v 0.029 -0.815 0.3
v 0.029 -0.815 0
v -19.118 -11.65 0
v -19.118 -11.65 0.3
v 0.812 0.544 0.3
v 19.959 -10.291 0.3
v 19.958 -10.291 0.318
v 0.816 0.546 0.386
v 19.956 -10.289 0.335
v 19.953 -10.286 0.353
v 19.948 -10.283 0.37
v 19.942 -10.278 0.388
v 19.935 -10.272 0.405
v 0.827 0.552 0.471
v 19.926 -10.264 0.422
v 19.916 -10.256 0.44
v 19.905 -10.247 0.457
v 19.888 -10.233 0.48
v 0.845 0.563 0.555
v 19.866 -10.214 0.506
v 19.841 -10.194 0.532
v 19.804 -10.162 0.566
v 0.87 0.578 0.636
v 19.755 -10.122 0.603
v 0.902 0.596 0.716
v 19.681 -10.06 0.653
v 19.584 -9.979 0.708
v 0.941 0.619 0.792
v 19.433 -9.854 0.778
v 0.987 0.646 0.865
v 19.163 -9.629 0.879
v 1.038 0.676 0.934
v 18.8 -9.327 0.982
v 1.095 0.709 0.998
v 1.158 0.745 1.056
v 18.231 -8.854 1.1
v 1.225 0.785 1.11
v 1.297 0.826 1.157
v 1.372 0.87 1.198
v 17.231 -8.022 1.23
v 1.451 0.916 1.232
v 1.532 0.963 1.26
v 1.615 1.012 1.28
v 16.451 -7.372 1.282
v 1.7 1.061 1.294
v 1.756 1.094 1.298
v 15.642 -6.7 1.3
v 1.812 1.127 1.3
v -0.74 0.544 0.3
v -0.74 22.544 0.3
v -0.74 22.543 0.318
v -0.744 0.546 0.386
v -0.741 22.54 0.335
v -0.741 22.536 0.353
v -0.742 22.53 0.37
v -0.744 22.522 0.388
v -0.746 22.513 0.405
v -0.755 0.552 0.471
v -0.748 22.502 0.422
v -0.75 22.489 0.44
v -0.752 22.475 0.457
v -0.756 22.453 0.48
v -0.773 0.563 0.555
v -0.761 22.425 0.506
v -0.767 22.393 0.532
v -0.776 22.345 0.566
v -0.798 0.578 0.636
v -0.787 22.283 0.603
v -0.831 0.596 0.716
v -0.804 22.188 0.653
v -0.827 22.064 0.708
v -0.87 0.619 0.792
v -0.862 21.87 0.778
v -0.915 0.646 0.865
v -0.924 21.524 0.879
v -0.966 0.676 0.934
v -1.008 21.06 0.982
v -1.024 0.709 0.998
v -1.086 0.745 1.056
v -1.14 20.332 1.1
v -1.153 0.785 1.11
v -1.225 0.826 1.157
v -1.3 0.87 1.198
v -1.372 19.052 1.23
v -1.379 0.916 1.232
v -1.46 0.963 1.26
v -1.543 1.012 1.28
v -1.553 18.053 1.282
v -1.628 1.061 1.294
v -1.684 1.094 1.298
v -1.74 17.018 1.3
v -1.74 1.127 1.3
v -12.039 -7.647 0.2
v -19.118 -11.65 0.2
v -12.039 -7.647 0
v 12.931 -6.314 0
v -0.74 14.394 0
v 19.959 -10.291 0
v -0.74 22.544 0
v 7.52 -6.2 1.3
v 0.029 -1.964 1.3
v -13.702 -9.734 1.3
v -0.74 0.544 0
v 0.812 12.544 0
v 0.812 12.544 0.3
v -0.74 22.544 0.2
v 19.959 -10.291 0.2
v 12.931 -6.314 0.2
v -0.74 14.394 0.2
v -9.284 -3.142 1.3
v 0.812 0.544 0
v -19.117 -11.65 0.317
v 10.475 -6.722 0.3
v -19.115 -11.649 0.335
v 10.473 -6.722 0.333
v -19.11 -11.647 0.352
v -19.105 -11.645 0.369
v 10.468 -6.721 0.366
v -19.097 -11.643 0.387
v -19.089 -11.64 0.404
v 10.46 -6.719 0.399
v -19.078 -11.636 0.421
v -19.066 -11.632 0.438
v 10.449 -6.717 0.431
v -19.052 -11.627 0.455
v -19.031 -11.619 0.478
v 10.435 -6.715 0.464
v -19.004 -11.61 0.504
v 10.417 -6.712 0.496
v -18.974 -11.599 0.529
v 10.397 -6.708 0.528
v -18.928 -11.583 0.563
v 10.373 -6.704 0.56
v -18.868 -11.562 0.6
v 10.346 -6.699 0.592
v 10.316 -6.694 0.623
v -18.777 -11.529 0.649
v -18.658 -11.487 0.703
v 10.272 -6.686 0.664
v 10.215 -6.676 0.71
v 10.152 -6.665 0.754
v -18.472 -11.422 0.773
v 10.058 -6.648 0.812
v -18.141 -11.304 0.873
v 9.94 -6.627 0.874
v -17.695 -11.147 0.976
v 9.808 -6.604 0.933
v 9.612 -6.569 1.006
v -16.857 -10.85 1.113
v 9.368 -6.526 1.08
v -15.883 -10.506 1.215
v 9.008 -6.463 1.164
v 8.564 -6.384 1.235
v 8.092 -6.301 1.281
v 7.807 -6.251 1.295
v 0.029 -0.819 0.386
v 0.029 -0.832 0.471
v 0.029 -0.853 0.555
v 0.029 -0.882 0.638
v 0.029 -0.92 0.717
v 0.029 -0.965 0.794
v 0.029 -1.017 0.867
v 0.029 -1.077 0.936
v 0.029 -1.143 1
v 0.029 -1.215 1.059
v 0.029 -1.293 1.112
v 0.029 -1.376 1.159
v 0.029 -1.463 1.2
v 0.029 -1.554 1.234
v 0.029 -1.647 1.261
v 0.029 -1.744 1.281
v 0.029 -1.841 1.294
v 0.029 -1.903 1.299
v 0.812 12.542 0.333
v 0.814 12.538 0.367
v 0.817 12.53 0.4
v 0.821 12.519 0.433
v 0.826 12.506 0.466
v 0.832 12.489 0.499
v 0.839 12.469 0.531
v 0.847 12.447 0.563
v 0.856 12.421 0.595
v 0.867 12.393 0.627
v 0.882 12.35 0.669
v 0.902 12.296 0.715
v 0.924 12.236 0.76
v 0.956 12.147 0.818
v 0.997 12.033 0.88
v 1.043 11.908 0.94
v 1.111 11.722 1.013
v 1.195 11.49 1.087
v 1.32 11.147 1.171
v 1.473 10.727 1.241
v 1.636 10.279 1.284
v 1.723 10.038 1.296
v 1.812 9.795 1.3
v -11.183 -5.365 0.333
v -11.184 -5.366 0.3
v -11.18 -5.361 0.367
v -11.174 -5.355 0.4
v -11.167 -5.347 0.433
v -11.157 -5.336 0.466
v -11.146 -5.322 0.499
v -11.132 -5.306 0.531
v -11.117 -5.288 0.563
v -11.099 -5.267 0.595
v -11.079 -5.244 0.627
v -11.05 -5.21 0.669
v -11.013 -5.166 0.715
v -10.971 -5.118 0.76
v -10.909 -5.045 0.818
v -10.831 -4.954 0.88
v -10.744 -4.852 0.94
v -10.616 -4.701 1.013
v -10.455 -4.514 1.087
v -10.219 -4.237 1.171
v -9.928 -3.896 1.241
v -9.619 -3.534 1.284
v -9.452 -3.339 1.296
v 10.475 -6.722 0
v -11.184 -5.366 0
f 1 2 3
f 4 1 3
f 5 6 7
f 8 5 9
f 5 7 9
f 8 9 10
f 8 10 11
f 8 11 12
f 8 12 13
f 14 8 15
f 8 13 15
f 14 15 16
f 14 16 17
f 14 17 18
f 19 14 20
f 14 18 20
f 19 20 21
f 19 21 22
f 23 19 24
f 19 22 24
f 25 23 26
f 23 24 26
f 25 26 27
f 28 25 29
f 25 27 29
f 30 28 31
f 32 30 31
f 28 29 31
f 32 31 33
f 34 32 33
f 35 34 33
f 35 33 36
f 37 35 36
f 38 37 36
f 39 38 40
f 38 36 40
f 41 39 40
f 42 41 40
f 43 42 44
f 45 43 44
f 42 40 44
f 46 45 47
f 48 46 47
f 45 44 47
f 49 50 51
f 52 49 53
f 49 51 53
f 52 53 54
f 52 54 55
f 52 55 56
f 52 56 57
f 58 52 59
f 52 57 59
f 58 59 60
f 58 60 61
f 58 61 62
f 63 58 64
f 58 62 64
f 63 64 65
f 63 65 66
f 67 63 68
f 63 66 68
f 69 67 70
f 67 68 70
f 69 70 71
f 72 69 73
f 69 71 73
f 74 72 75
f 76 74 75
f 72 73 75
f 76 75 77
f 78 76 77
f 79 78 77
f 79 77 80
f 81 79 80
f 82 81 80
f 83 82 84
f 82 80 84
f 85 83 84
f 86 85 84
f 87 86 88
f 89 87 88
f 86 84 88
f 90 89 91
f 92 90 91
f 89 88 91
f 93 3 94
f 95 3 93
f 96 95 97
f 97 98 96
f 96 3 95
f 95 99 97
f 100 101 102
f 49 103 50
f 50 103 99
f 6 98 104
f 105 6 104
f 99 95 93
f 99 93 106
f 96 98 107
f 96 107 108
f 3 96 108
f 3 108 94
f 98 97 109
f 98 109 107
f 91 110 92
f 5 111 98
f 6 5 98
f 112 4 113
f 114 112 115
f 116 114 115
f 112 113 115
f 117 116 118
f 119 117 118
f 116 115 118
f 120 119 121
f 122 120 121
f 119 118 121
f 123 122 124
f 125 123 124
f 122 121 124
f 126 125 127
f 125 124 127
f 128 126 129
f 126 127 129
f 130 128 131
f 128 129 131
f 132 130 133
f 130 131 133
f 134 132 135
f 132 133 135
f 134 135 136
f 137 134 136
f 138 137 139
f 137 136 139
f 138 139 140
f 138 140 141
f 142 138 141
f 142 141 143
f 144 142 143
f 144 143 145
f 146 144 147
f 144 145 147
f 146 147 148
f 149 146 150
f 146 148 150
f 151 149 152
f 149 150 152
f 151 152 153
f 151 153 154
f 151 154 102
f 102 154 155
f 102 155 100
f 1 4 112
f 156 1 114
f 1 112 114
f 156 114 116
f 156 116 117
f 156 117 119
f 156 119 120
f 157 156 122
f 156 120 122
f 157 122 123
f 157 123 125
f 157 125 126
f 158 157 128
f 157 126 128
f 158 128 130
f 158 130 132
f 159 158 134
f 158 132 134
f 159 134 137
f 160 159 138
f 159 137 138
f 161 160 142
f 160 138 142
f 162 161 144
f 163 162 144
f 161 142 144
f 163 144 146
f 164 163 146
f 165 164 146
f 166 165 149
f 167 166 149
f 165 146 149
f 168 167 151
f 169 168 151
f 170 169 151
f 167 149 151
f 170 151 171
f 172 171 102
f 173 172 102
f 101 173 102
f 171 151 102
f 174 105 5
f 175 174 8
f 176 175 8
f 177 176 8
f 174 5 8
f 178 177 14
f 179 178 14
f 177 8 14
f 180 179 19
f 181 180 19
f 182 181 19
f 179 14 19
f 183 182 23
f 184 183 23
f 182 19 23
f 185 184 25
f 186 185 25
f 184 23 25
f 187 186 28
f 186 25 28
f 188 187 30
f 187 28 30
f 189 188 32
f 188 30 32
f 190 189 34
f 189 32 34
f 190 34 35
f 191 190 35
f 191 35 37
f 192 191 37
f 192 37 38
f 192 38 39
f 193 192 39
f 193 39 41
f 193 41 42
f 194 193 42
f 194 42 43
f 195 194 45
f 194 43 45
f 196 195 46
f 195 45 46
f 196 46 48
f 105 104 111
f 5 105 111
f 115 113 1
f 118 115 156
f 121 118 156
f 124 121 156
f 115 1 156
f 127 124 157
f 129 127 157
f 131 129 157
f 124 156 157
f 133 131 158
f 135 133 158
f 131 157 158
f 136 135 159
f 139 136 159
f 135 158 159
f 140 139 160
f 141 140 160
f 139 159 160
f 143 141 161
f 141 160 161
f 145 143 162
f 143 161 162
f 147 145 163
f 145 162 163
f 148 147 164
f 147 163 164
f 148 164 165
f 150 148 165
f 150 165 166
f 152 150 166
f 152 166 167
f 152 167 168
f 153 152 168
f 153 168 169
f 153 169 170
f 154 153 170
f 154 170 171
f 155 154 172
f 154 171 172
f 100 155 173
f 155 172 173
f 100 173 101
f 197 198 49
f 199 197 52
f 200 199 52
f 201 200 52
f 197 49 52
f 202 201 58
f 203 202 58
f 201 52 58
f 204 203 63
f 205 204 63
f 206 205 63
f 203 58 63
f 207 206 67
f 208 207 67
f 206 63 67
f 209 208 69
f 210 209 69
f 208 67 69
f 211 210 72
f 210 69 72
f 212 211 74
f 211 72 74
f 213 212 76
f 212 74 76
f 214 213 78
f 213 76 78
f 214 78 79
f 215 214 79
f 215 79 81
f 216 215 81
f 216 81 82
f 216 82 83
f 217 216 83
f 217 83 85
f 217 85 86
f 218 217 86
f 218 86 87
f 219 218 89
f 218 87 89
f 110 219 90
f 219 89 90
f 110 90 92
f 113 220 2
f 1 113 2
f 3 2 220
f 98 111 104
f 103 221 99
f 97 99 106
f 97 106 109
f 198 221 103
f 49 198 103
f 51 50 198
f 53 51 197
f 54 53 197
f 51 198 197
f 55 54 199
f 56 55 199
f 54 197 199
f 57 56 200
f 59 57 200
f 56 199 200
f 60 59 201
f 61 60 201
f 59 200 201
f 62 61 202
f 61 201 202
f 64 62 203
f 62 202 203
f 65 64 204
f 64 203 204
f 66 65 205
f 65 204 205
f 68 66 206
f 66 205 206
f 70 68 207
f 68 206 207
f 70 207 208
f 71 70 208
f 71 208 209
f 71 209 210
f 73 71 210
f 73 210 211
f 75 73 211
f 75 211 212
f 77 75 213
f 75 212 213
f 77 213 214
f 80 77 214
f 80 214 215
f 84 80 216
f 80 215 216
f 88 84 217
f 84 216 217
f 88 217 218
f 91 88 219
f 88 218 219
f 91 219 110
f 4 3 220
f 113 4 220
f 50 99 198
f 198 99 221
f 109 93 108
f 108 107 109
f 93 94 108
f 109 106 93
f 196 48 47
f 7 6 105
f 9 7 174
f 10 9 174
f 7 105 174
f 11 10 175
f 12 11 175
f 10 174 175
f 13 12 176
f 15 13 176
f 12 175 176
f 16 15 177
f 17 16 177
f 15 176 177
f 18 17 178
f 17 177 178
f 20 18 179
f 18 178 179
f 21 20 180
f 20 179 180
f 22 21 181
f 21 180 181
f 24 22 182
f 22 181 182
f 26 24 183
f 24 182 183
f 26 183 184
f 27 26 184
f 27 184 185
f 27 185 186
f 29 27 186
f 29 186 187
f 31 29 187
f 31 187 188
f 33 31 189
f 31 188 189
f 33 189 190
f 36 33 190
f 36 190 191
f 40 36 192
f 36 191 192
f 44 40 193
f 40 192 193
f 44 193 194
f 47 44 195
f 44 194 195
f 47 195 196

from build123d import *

# Parameters (mm, degrees)
F1_DEPTH = 1.3
F2_R     = 1
F4_DEPTH = 0.2


with BuildPart() as f1:
    # F0 (on Top) → F1 (new body)
    with BuildSketch(Plane.XY):
        Polygon((-0.740023, 22.543637), (-11.183773, -5.366363), (-0.740023, 0.543637), align=None)
        Polygon((19.958762, -10.291363), (0.811889, 12.543637), (0.811889, 0.543637), align=None)
        Polygon((-19.11781, -11.650001), (10.474633, -6.721784), (0.029064, -0.815001), align=None)
    extrude(amount=F1_DEPTH)

    # F2
    f2_edges = [f1.edges().sort_by_distance(p)[0] for p in [
        (-5.961898, 8.588637, 1.3),
        (-5.961898, -2.411363, 1.3),
        (-0.740023, 11.543637, 1.3),
        (10.385326, 1.126137, 1.3),
        (0.811889, 6.543637, 1.3),
        (10.385326, -4.873863, 1.3),
        (-4.321588, -9.185892, 1.3),
        (5.251849, -3.768392, 1.3),
        (-9.544373, -6.232501, 1.3),
    ]]
    fillet(f2_edges, radius=F2_R)


with BuildPart() as f4:
    # F3 (on face) → F4 (new body)
    with BuildSketch(Plane(origin=(0, 0, 0), x_dir=(1, 0, 0), z_dir=(0, 0, -1))):
        Polygon((-0.739928, -14.394369), (19.958762, 10.291363), (12.930588, 6.314199), (-19.117869, 11.650017), (-12.039473, 7.646511), (-0.739928, -22.543753), align=None)
    extrude(amount=-F4_DEPTH)


solid = Compound([f1.part, f4.part])
